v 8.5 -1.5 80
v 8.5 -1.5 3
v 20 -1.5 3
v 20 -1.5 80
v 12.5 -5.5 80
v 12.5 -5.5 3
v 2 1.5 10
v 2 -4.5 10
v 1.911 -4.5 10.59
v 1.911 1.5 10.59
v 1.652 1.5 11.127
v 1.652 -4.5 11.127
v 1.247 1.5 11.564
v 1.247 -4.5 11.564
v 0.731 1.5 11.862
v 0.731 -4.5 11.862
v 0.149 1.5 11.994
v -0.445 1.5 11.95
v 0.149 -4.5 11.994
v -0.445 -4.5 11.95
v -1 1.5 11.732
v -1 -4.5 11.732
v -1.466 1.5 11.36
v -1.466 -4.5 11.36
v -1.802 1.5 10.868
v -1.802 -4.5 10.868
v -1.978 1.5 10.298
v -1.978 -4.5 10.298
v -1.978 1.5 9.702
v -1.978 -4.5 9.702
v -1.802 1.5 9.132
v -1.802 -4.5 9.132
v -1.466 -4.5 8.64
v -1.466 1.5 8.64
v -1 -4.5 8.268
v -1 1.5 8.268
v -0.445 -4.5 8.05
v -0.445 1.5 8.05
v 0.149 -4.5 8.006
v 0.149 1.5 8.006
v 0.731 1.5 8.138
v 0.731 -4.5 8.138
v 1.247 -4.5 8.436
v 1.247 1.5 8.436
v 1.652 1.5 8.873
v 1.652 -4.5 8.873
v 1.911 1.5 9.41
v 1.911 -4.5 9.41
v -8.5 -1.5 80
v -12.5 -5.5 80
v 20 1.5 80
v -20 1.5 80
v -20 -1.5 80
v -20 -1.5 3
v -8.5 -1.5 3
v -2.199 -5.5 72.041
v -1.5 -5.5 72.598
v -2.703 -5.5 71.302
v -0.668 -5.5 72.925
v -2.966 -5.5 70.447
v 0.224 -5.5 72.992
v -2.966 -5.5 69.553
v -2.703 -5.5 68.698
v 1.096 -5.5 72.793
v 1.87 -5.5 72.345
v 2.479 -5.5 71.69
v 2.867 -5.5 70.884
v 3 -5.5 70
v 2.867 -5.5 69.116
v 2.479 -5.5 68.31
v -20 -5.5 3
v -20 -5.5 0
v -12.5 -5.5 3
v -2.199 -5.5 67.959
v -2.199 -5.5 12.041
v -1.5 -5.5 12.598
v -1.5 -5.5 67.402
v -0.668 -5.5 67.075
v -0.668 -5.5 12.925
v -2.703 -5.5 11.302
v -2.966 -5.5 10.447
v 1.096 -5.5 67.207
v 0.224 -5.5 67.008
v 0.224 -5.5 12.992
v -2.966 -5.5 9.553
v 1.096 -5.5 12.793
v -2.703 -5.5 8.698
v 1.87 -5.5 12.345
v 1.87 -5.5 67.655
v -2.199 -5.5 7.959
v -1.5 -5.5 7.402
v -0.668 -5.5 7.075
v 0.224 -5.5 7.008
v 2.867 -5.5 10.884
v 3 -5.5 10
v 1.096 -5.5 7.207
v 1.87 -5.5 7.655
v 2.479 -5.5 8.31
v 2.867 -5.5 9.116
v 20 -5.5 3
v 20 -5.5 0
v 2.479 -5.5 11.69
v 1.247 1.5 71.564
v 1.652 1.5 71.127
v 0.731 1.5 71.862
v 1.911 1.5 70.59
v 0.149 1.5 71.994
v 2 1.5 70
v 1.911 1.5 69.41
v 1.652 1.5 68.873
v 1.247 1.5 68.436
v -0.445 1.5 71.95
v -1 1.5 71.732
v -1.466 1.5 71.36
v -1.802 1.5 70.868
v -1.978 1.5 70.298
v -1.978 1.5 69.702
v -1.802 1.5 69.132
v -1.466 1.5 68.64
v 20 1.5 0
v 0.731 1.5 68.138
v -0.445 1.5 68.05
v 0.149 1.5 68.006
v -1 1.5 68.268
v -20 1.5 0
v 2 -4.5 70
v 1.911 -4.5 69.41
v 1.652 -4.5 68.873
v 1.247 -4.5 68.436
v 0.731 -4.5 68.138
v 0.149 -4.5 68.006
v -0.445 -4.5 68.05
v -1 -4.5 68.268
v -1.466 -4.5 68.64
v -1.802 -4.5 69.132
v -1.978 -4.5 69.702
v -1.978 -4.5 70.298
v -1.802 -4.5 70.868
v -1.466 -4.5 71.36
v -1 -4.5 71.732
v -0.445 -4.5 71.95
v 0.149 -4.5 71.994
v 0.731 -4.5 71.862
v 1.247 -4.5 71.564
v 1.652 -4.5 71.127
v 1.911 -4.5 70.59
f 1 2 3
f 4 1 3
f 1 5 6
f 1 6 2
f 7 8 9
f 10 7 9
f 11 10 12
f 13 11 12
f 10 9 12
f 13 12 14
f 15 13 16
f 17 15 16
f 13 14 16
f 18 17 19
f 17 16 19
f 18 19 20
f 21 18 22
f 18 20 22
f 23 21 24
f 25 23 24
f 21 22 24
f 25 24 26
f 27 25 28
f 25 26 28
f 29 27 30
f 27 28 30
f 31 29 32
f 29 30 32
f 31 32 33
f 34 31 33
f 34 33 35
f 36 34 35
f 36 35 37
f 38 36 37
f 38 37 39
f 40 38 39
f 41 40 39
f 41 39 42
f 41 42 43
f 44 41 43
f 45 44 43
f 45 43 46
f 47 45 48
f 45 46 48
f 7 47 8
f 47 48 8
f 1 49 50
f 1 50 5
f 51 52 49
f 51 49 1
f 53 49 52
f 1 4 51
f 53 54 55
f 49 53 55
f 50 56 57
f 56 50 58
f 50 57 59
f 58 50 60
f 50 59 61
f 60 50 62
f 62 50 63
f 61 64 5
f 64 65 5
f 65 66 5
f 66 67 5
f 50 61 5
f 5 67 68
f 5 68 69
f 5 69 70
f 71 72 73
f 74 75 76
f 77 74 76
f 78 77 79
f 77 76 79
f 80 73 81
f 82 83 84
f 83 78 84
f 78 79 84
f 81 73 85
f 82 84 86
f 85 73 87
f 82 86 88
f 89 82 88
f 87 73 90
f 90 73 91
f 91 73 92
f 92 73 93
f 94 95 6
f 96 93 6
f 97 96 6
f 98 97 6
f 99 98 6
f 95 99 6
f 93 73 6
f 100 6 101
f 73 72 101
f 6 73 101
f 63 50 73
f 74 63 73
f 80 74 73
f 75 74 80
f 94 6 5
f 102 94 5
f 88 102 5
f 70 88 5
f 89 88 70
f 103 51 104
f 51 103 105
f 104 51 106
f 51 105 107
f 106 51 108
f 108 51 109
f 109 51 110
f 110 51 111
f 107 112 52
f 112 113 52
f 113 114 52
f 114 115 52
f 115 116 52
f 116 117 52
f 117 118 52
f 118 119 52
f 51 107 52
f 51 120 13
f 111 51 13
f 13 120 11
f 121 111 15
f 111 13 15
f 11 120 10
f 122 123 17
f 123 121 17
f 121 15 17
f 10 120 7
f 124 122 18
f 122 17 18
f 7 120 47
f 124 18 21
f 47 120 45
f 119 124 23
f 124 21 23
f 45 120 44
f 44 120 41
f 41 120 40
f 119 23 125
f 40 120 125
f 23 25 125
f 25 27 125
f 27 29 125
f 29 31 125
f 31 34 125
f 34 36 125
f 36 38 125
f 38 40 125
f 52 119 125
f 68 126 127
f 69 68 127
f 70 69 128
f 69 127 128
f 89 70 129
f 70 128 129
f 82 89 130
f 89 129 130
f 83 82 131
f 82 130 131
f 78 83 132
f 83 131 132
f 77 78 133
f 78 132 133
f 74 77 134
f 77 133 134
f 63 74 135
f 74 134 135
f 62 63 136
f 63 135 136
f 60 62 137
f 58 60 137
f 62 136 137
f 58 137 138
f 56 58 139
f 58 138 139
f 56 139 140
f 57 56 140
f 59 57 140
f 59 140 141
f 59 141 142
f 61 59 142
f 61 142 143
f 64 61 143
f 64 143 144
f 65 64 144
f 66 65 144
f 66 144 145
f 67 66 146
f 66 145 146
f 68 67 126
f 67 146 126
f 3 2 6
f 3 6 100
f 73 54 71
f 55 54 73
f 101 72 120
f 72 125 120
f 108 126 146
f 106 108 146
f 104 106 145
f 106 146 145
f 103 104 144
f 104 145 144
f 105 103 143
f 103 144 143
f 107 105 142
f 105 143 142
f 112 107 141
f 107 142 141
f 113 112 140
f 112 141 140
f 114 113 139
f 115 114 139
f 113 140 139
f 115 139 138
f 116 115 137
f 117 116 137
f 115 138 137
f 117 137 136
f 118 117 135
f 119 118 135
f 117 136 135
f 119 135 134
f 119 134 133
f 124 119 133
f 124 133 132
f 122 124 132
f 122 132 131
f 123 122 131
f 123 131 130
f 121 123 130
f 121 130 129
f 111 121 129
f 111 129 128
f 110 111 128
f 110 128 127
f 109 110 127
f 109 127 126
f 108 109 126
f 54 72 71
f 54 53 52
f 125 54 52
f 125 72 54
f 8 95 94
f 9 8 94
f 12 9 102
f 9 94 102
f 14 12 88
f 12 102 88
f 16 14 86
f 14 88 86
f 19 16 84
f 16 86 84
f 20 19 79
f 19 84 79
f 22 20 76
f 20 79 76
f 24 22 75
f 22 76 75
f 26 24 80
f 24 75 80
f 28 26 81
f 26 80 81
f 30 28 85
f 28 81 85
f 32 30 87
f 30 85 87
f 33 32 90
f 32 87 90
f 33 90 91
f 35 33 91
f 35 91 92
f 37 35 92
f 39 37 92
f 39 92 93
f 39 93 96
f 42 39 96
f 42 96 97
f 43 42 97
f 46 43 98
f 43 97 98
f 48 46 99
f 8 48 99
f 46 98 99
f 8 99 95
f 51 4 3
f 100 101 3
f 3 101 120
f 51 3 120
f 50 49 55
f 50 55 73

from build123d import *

# Parameters (mm, degrees)
F1_DEPTH = 80
F2_R     = 2
F3_DEPTH = 12.5
F4_SIZE  = 1
F5_W     = 40
F5_H     = 4
F6_DEPTH = 3


with BuildPart() as f1:
    # F0 (on Top) → F1 (new body)
    with BuildSketch(Plane.XY):
        Polygon((20, 1.5), (-20, 1.5), (-20, -1.5), (-8.5, -1.5), (8.5, -1.5), (20, -1.5), align=None)
        Polygon((8.5, -1.5), (-8.5, -1.5), (-12.5, -5.5), (12.5, -5.5), align=None)
    extrude(amount=F1_DEPTH)

    # F2 (on face) → F3 (cut, symmetric)
    with BuildSketch(Plane.XZ.offset(1.5)):
        with Locations((0, 70)):
            Circle(F2_R)
        with Locations((0, 10)):
            Circle(F2_R)
    extrude(amount=F3_DEPTH, both=True, mode=Mode.SUBTRACT)

    # F4
    f4_edges = [f1.edges().sort_by_distance(p)[0] for p in [
        (-2, -5.5, 70),
        (-2, -5.5, 10),
    ]]
    chamfer(f4_edges, length=F4_SIZE)

    # F5 (on Top) → F6 (join)
    with BuildSketch(Plane.XY):
        with Locations((0, -3.5)):
            Rectangle(F5_W, F5_H)
    extrude(amount=F6_DEPTH)


solid = f1.part
